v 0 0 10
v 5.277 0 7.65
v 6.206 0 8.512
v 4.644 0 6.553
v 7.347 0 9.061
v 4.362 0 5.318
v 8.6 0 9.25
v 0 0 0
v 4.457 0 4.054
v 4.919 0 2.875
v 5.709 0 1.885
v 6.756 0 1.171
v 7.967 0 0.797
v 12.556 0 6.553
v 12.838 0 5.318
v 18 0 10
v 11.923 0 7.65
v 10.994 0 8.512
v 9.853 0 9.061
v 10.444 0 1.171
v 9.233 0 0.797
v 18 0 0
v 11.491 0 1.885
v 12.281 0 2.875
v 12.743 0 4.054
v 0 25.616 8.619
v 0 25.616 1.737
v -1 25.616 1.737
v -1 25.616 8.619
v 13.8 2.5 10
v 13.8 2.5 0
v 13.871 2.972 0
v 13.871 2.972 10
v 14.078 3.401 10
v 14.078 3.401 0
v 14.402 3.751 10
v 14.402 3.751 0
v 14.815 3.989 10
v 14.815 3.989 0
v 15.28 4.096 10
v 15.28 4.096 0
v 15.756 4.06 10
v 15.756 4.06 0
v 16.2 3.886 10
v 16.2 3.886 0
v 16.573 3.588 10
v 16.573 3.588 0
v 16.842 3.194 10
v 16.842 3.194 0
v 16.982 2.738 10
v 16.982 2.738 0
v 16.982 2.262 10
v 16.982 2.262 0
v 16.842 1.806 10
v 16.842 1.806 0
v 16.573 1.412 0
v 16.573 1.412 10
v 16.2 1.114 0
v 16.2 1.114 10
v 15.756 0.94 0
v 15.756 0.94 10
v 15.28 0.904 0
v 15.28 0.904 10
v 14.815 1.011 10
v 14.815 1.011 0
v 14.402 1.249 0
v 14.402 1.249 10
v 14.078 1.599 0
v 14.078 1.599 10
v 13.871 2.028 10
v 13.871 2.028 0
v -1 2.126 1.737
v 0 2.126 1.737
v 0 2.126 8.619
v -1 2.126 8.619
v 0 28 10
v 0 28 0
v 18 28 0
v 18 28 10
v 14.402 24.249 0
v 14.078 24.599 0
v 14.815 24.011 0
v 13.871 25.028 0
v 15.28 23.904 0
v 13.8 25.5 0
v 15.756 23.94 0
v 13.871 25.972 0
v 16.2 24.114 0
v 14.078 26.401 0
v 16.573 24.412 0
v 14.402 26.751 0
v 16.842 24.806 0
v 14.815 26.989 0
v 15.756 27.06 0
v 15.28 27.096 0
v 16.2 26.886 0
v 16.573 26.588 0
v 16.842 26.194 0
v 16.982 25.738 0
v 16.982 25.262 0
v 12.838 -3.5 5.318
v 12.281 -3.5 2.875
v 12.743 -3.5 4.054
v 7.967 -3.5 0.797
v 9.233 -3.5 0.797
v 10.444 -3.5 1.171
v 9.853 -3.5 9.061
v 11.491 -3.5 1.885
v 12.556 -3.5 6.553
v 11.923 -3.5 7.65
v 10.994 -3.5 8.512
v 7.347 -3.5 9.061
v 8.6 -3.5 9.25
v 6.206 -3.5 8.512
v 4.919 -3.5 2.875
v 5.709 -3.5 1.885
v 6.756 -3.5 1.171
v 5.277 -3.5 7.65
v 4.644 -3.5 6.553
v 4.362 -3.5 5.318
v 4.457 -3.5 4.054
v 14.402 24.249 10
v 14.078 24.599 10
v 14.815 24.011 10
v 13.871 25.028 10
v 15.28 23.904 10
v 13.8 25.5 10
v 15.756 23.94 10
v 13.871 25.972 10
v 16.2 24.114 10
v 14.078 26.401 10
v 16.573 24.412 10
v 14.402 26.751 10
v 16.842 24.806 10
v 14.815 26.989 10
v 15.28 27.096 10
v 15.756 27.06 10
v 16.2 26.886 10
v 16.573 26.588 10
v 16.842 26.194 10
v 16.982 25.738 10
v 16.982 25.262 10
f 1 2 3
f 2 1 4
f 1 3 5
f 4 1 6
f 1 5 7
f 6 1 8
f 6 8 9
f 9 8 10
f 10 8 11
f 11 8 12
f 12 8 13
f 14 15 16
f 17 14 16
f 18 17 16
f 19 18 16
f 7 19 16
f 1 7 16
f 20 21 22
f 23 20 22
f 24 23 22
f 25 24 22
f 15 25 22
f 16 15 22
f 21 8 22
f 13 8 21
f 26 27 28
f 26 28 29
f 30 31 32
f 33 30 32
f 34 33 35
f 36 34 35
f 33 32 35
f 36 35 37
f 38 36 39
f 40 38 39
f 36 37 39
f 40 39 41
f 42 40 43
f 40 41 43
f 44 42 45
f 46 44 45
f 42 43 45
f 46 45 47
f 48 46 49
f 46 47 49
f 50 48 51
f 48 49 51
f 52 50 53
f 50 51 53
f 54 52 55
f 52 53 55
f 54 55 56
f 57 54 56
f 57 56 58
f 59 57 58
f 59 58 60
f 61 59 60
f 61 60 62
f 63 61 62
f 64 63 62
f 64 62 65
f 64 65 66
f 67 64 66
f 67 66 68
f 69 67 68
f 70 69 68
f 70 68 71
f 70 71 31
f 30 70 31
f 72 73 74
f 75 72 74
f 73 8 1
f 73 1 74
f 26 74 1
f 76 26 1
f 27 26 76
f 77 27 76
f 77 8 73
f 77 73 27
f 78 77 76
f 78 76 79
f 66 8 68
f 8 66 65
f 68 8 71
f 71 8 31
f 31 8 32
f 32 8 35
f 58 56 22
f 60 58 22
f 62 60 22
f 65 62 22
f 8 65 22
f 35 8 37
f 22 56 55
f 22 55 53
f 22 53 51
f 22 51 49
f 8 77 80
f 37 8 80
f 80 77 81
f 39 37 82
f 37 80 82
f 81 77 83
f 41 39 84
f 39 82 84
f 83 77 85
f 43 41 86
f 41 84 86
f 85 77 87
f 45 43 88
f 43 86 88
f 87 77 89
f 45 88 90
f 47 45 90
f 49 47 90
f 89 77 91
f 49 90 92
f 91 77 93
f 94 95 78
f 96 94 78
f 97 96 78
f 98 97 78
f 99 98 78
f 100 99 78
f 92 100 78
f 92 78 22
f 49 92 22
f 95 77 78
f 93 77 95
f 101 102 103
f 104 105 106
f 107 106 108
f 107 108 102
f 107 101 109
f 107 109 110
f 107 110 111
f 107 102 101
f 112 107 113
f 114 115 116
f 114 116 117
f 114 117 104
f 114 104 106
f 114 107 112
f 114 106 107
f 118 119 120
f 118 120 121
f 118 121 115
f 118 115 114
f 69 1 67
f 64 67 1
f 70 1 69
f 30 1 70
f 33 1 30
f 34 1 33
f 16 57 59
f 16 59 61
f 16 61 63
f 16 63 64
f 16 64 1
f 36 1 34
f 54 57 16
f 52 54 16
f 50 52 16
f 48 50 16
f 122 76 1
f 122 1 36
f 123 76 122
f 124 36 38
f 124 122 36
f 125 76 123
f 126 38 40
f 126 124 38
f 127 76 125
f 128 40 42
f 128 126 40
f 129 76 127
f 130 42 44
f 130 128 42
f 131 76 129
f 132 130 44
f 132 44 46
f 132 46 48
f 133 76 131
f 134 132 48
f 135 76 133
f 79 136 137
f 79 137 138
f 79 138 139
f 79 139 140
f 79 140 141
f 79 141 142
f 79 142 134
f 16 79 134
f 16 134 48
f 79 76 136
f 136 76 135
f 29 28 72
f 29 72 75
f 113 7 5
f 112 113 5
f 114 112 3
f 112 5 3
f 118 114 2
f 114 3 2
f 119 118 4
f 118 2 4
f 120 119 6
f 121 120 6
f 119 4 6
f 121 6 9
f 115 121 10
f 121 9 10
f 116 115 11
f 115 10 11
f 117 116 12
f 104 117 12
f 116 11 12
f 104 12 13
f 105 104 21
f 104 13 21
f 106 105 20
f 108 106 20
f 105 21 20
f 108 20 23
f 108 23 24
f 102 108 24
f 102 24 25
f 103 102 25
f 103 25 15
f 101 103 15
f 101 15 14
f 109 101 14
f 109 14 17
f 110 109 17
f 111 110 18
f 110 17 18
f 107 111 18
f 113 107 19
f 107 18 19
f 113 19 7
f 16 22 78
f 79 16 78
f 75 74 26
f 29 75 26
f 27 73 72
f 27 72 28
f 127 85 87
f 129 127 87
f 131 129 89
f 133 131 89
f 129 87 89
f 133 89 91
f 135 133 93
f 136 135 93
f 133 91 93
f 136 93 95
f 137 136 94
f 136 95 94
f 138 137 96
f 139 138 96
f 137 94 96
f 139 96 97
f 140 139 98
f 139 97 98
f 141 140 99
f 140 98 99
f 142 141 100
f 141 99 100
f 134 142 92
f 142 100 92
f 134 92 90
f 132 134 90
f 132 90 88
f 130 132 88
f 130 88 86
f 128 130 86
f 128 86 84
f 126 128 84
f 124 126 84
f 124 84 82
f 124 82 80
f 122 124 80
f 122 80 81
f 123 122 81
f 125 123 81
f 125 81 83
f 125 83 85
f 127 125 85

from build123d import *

# Parameters (mm, degrees)
ESQUISSE1_W             = 18
ESQUISSE1_H             = 28
BOSS_EXTRU_1_DEPTH      = 10
ESQUISSE3_R             = 4.25
BOSS_EXTRU_2_DEPTH      = 3.5
ESQUISSE4_R             = 1.6
ENL_V_MAT_EXTRU_1_DEPTH = 10.2
ESQUISSE5_R             = 1.6
ENL_V_MAT_EXTRU_2_DEPTH = 10.2
ESQUISSE6_W             = 6.88236931
ESQUISSE6_H             = 23.48997152
BOSS_EXTRU_3_DEPTH      = 1


with BuildPart() as part:
    # Esquisse1 → Boss.-Extru.1 (new body)
    with BuildSketch(Plane.XY):
        with Locations((9, 14)):
            Rectangle(ESQUISSE1_W, ESQUISSE1_H)
    extrude(amount=BOSS_EXTRU_1_DEPTH)

    # Esquisse3 → Boss.-Extru.2 (add)
    with BuildSketch(Plane.XZ):
        with Locations(Location((8.6, 5, 0), (0, 0, 90))):
            Circle(ESQUISSE3_R)
    extrude(amount=BOSS_EXTRU_2_DEPTH)

    # Esquisse4 → Enlèv. mat.-Extru.1 (cut)
    with BuildSketch(Plane(origin=(0, 0, 0), x_dir=(-1, 0, 0), z_dir=(0, 0, -1))):
        with Locations((-15.4, 25.5)):
            Circle(ESQUISSE4_R)
    extrude(amount=-ENL_V_MAT_EXTRU_1_DEPTH, mode=Mode.SUBTRACT)

    # Esquisse5 → Enlèv. mat.-Extru.2 (cut)
    with BuildSketch(Plane(origin=(0, 0, 0), x_dir=(-1, 0, 0), z_dir=(0, 0, -1))):
        with Locations((-15.4, 2.5)):
            Circle(ESQUISSE5_R)
    extrude(amount=-ENL_V_MAT_EXTRU_2_DEPTH, mode=Mode.SUBTRACT)

    # Esquisse6 → Boss.-Extru.3 (add)
    with BuildSketch(Plane.ZY):
        with Locations((5.178101781, 13.870853196)):
            Rectangle(ESQUISSE6_W, ESQUISSE6_H)
    extrude(amount=BOSS_EXTRU_3_DEPTH)


solid = part.part
